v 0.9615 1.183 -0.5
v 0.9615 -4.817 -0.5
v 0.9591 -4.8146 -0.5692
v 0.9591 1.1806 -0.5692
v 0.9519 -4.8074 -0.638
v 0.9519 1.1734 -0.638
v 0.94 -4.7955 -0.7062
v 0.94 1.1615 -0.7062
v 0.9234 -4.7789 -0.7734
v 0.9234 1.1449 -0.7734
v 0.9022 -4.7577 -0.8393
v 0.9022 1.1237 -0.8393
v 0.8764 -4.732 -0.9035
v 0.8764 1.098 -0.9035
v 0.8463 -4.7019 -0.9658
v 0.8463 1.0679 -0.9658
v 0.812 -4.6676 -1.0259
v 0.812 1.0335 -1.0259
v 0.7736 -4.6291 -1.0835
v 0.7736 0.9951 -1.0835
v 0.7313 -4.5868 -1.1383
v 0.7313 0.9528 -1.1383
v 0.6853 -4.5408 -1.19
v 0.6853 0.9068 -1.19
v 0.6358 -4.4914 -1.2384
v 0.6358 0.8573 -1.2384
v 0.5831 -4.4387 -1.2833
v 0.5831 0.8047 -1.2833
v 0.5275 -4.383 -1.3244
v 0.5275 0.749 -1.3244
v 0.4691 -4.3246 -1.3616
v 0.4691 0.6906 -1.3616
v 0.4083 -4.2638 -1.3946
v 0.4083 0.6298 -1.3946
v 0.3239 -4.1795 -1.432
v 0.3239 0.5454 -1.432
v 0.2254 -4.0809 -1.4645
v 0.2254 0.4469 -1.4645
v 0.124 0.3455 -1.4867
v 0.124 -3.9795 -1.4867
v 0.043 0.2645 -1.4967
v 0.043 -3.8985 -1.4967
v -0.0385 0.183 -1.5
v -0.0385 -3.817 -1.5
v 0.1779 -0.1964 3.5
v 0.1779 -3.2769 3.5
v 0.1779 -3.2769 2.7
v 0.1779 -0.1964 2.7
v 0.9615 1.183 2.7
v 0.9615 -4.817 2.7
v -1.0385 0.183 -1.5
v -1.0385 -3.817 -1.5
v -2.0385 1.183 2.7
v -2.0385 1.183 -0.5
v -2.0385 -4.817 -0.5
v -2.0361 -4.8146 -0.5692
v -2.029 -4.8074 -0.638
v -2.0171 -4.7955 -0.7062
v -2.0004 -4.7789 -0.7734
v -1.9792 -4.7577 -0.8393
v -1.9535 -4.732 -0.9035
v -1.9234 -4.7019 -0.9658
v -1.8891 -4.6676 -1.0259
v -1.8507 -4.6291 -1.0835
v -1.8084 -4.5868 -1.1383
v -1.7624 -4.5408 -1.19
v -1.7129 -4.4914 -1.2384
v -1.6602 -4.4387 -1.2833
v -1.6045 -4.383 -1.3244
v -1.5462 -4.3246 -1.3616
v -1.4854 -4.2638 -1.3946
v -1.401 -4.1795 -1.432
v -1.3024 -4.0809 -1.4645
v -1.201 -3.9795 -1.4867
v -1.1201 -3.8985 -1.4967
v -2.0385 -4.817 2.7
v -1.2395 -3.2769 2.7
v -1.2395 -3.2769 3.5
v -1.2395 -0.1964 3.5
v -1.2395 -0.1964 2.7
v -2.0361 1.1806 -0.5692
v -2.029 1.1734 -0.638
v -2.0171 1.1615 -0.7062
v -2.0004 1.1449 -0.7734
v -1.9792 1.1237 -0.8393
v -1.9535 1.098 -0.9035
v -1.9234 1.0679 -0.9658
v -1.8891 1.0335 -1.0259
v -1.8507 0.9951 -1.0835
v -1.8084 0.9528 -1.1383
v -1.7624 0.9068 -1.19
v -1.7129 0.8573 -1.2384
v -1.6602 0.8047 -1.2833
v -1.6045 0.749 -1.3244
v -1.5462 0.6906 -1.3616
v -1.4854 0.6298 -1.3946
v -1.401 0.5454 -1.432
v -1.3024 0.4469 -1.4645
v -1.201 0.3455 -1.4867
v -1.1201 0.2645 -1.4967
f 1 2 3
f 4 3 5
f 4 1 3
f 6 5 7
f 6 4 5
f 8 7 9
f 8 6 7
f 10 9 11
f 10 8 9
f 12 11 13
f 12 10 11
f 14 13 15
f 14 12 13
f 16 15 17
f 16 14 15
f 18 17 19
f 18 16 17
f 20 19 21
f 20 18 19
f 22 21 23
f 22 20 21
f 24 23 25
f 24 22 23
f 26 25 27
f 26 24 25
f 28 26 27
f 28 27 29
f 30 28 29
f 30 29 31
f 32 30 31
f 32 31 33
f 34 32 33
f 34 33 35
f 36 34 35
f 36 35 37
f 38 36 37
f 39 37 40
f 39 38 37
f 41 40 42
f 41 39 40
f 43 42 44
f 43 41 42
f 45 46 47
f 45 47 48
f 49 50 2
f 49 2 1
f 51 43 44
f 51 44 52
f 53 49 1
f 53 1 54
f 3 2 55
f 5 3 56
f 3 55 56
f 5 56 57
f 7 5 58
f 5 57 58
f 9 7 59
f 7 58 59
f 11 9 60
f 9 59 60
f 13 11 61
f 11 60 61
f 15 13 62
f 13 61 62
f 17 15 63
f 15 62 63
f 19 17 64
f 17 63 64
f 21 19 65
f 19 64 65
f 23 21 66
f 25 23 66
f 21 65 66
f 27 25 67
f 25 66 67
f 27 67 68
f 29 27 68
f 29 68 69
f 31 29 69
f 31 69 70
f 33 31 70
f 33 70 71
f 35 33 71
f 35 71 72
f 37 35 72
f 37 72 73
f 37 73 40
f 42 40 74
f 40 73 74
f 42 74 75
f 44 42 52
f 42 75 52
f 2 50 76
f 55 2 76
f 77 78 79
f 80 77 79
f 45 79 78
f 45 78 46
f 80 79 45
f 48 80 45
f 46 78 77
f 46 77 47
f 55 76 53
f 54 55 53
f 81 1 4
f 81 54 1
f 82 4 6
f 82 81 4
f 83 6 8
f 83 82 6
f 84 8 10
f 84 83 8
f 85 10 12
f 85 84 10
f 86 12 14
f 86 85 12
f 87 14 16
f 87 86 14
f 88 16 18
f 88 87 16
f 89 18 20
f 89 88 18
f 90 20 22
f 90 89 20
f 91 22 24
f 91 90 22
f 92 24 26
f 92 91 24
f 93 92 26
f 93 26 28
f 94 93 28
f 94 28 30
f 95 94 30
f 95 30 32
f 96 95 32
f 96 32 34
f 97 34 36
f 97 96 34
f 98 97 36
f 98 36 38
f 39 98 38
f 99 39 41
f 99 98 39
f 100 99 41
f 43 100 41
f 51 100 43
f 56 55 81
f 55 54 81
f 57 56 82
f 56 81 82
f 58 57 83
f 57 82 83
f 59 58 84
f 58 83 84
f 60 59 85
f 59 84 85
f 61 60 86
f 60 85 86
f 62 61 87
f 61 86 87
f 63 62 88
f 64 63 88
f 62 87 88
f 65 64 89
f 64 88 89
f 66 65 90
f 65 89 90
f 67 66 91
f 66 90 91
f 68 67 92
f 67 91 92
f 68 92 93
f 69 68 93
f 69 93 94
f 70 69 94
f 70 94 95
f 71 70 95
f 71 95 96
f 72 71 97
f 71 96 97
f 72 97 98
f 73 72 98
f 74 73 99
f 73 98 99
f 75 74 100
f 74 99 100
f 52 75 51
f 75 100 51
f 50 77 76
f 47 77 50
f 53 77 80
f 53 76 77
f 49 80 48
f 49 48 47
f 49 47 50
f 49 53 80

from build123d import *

# Parameters (mm, degrees)
SKETCH_3_W           = 3
SKETCH_3_H           = 6
EXTRUDE_2_DEPTH      = 3.5
SKETCH_4_OUTSIDE_W   = 6.514
SKETCH_4_OUTSIDE_H   = 9.514
SKETCH_4_OUTSIDE_W_2 = 1.417406922
SKETCH_4_OUTSIDE_H_2 = 3.080497711
CUT_EXTRUDE_1_DEPTH  = 0.8
SKETCH_9_W           = 3
SKETCH_9_H           = 6
EXTRUDE_5_DEPTH      = 1.5
FILLET_2_R           = 1


with BuildPart() as part:
    # 草图3 → 凸台-拉伸2 (new body)
    with BuildSketch(Plane.XY):
        with Locations((-0.538539978, -1.817017803)):
            Rectangle(SKETCH_3_W, SKETCH_3_H)
    extrude(amount=EXTRUDE_2_DEPTH)

    # 草图4 outside → 切除-拉伸1 (cut)
    with BuildSketch(Plane.XY.offset(3.5)):
        with Locations((-0.539, -1.817)):
            Rectangle(SKETCH_4_OUTSIDE_W, SKETCH_4_OUTSIDE_H)
        with Locations((-0.530790021, -1.736698078)):
            Rectangle(SKETCH_4_OUTSIDE_W_2, SKETCH_4_OUTSIDE_H_2, mode=Mode.SUBTRACT)
    extrude(amount=-CUT_EXTRUDE_1_DEPTH, mode=Mode.SUBTRACT)

    # 草图9 → 凸台-拉伸5 (add)
    with BuildSketch(Plane(origin=(0, 0, 0), x_dir=(-1, 0, 0), z_dir=(0, 0, -1))):
        with Locations((0.538539978, -1.817017803)):
            Rectangle(SKETCH_9_W, SKETCH_9_H)
    extrude(amount=EXTRUDE_5_DEPTH)

    # 圆角2
    fillet_2_edges = [part.edges().sort_by_distance(p)[0] for p in [
        (0.961460022, -1.817017803, -1.5),
        (-0.538539978, -4.817017803, -1.5),
        (-2.038539978, -1.817017803, -1.5),
        (-0.538539978, 1.182982197, -1.5),
    ]]
    fillet(fillet_2_edges, radius=FILLET_2_R)


solid = part.part
